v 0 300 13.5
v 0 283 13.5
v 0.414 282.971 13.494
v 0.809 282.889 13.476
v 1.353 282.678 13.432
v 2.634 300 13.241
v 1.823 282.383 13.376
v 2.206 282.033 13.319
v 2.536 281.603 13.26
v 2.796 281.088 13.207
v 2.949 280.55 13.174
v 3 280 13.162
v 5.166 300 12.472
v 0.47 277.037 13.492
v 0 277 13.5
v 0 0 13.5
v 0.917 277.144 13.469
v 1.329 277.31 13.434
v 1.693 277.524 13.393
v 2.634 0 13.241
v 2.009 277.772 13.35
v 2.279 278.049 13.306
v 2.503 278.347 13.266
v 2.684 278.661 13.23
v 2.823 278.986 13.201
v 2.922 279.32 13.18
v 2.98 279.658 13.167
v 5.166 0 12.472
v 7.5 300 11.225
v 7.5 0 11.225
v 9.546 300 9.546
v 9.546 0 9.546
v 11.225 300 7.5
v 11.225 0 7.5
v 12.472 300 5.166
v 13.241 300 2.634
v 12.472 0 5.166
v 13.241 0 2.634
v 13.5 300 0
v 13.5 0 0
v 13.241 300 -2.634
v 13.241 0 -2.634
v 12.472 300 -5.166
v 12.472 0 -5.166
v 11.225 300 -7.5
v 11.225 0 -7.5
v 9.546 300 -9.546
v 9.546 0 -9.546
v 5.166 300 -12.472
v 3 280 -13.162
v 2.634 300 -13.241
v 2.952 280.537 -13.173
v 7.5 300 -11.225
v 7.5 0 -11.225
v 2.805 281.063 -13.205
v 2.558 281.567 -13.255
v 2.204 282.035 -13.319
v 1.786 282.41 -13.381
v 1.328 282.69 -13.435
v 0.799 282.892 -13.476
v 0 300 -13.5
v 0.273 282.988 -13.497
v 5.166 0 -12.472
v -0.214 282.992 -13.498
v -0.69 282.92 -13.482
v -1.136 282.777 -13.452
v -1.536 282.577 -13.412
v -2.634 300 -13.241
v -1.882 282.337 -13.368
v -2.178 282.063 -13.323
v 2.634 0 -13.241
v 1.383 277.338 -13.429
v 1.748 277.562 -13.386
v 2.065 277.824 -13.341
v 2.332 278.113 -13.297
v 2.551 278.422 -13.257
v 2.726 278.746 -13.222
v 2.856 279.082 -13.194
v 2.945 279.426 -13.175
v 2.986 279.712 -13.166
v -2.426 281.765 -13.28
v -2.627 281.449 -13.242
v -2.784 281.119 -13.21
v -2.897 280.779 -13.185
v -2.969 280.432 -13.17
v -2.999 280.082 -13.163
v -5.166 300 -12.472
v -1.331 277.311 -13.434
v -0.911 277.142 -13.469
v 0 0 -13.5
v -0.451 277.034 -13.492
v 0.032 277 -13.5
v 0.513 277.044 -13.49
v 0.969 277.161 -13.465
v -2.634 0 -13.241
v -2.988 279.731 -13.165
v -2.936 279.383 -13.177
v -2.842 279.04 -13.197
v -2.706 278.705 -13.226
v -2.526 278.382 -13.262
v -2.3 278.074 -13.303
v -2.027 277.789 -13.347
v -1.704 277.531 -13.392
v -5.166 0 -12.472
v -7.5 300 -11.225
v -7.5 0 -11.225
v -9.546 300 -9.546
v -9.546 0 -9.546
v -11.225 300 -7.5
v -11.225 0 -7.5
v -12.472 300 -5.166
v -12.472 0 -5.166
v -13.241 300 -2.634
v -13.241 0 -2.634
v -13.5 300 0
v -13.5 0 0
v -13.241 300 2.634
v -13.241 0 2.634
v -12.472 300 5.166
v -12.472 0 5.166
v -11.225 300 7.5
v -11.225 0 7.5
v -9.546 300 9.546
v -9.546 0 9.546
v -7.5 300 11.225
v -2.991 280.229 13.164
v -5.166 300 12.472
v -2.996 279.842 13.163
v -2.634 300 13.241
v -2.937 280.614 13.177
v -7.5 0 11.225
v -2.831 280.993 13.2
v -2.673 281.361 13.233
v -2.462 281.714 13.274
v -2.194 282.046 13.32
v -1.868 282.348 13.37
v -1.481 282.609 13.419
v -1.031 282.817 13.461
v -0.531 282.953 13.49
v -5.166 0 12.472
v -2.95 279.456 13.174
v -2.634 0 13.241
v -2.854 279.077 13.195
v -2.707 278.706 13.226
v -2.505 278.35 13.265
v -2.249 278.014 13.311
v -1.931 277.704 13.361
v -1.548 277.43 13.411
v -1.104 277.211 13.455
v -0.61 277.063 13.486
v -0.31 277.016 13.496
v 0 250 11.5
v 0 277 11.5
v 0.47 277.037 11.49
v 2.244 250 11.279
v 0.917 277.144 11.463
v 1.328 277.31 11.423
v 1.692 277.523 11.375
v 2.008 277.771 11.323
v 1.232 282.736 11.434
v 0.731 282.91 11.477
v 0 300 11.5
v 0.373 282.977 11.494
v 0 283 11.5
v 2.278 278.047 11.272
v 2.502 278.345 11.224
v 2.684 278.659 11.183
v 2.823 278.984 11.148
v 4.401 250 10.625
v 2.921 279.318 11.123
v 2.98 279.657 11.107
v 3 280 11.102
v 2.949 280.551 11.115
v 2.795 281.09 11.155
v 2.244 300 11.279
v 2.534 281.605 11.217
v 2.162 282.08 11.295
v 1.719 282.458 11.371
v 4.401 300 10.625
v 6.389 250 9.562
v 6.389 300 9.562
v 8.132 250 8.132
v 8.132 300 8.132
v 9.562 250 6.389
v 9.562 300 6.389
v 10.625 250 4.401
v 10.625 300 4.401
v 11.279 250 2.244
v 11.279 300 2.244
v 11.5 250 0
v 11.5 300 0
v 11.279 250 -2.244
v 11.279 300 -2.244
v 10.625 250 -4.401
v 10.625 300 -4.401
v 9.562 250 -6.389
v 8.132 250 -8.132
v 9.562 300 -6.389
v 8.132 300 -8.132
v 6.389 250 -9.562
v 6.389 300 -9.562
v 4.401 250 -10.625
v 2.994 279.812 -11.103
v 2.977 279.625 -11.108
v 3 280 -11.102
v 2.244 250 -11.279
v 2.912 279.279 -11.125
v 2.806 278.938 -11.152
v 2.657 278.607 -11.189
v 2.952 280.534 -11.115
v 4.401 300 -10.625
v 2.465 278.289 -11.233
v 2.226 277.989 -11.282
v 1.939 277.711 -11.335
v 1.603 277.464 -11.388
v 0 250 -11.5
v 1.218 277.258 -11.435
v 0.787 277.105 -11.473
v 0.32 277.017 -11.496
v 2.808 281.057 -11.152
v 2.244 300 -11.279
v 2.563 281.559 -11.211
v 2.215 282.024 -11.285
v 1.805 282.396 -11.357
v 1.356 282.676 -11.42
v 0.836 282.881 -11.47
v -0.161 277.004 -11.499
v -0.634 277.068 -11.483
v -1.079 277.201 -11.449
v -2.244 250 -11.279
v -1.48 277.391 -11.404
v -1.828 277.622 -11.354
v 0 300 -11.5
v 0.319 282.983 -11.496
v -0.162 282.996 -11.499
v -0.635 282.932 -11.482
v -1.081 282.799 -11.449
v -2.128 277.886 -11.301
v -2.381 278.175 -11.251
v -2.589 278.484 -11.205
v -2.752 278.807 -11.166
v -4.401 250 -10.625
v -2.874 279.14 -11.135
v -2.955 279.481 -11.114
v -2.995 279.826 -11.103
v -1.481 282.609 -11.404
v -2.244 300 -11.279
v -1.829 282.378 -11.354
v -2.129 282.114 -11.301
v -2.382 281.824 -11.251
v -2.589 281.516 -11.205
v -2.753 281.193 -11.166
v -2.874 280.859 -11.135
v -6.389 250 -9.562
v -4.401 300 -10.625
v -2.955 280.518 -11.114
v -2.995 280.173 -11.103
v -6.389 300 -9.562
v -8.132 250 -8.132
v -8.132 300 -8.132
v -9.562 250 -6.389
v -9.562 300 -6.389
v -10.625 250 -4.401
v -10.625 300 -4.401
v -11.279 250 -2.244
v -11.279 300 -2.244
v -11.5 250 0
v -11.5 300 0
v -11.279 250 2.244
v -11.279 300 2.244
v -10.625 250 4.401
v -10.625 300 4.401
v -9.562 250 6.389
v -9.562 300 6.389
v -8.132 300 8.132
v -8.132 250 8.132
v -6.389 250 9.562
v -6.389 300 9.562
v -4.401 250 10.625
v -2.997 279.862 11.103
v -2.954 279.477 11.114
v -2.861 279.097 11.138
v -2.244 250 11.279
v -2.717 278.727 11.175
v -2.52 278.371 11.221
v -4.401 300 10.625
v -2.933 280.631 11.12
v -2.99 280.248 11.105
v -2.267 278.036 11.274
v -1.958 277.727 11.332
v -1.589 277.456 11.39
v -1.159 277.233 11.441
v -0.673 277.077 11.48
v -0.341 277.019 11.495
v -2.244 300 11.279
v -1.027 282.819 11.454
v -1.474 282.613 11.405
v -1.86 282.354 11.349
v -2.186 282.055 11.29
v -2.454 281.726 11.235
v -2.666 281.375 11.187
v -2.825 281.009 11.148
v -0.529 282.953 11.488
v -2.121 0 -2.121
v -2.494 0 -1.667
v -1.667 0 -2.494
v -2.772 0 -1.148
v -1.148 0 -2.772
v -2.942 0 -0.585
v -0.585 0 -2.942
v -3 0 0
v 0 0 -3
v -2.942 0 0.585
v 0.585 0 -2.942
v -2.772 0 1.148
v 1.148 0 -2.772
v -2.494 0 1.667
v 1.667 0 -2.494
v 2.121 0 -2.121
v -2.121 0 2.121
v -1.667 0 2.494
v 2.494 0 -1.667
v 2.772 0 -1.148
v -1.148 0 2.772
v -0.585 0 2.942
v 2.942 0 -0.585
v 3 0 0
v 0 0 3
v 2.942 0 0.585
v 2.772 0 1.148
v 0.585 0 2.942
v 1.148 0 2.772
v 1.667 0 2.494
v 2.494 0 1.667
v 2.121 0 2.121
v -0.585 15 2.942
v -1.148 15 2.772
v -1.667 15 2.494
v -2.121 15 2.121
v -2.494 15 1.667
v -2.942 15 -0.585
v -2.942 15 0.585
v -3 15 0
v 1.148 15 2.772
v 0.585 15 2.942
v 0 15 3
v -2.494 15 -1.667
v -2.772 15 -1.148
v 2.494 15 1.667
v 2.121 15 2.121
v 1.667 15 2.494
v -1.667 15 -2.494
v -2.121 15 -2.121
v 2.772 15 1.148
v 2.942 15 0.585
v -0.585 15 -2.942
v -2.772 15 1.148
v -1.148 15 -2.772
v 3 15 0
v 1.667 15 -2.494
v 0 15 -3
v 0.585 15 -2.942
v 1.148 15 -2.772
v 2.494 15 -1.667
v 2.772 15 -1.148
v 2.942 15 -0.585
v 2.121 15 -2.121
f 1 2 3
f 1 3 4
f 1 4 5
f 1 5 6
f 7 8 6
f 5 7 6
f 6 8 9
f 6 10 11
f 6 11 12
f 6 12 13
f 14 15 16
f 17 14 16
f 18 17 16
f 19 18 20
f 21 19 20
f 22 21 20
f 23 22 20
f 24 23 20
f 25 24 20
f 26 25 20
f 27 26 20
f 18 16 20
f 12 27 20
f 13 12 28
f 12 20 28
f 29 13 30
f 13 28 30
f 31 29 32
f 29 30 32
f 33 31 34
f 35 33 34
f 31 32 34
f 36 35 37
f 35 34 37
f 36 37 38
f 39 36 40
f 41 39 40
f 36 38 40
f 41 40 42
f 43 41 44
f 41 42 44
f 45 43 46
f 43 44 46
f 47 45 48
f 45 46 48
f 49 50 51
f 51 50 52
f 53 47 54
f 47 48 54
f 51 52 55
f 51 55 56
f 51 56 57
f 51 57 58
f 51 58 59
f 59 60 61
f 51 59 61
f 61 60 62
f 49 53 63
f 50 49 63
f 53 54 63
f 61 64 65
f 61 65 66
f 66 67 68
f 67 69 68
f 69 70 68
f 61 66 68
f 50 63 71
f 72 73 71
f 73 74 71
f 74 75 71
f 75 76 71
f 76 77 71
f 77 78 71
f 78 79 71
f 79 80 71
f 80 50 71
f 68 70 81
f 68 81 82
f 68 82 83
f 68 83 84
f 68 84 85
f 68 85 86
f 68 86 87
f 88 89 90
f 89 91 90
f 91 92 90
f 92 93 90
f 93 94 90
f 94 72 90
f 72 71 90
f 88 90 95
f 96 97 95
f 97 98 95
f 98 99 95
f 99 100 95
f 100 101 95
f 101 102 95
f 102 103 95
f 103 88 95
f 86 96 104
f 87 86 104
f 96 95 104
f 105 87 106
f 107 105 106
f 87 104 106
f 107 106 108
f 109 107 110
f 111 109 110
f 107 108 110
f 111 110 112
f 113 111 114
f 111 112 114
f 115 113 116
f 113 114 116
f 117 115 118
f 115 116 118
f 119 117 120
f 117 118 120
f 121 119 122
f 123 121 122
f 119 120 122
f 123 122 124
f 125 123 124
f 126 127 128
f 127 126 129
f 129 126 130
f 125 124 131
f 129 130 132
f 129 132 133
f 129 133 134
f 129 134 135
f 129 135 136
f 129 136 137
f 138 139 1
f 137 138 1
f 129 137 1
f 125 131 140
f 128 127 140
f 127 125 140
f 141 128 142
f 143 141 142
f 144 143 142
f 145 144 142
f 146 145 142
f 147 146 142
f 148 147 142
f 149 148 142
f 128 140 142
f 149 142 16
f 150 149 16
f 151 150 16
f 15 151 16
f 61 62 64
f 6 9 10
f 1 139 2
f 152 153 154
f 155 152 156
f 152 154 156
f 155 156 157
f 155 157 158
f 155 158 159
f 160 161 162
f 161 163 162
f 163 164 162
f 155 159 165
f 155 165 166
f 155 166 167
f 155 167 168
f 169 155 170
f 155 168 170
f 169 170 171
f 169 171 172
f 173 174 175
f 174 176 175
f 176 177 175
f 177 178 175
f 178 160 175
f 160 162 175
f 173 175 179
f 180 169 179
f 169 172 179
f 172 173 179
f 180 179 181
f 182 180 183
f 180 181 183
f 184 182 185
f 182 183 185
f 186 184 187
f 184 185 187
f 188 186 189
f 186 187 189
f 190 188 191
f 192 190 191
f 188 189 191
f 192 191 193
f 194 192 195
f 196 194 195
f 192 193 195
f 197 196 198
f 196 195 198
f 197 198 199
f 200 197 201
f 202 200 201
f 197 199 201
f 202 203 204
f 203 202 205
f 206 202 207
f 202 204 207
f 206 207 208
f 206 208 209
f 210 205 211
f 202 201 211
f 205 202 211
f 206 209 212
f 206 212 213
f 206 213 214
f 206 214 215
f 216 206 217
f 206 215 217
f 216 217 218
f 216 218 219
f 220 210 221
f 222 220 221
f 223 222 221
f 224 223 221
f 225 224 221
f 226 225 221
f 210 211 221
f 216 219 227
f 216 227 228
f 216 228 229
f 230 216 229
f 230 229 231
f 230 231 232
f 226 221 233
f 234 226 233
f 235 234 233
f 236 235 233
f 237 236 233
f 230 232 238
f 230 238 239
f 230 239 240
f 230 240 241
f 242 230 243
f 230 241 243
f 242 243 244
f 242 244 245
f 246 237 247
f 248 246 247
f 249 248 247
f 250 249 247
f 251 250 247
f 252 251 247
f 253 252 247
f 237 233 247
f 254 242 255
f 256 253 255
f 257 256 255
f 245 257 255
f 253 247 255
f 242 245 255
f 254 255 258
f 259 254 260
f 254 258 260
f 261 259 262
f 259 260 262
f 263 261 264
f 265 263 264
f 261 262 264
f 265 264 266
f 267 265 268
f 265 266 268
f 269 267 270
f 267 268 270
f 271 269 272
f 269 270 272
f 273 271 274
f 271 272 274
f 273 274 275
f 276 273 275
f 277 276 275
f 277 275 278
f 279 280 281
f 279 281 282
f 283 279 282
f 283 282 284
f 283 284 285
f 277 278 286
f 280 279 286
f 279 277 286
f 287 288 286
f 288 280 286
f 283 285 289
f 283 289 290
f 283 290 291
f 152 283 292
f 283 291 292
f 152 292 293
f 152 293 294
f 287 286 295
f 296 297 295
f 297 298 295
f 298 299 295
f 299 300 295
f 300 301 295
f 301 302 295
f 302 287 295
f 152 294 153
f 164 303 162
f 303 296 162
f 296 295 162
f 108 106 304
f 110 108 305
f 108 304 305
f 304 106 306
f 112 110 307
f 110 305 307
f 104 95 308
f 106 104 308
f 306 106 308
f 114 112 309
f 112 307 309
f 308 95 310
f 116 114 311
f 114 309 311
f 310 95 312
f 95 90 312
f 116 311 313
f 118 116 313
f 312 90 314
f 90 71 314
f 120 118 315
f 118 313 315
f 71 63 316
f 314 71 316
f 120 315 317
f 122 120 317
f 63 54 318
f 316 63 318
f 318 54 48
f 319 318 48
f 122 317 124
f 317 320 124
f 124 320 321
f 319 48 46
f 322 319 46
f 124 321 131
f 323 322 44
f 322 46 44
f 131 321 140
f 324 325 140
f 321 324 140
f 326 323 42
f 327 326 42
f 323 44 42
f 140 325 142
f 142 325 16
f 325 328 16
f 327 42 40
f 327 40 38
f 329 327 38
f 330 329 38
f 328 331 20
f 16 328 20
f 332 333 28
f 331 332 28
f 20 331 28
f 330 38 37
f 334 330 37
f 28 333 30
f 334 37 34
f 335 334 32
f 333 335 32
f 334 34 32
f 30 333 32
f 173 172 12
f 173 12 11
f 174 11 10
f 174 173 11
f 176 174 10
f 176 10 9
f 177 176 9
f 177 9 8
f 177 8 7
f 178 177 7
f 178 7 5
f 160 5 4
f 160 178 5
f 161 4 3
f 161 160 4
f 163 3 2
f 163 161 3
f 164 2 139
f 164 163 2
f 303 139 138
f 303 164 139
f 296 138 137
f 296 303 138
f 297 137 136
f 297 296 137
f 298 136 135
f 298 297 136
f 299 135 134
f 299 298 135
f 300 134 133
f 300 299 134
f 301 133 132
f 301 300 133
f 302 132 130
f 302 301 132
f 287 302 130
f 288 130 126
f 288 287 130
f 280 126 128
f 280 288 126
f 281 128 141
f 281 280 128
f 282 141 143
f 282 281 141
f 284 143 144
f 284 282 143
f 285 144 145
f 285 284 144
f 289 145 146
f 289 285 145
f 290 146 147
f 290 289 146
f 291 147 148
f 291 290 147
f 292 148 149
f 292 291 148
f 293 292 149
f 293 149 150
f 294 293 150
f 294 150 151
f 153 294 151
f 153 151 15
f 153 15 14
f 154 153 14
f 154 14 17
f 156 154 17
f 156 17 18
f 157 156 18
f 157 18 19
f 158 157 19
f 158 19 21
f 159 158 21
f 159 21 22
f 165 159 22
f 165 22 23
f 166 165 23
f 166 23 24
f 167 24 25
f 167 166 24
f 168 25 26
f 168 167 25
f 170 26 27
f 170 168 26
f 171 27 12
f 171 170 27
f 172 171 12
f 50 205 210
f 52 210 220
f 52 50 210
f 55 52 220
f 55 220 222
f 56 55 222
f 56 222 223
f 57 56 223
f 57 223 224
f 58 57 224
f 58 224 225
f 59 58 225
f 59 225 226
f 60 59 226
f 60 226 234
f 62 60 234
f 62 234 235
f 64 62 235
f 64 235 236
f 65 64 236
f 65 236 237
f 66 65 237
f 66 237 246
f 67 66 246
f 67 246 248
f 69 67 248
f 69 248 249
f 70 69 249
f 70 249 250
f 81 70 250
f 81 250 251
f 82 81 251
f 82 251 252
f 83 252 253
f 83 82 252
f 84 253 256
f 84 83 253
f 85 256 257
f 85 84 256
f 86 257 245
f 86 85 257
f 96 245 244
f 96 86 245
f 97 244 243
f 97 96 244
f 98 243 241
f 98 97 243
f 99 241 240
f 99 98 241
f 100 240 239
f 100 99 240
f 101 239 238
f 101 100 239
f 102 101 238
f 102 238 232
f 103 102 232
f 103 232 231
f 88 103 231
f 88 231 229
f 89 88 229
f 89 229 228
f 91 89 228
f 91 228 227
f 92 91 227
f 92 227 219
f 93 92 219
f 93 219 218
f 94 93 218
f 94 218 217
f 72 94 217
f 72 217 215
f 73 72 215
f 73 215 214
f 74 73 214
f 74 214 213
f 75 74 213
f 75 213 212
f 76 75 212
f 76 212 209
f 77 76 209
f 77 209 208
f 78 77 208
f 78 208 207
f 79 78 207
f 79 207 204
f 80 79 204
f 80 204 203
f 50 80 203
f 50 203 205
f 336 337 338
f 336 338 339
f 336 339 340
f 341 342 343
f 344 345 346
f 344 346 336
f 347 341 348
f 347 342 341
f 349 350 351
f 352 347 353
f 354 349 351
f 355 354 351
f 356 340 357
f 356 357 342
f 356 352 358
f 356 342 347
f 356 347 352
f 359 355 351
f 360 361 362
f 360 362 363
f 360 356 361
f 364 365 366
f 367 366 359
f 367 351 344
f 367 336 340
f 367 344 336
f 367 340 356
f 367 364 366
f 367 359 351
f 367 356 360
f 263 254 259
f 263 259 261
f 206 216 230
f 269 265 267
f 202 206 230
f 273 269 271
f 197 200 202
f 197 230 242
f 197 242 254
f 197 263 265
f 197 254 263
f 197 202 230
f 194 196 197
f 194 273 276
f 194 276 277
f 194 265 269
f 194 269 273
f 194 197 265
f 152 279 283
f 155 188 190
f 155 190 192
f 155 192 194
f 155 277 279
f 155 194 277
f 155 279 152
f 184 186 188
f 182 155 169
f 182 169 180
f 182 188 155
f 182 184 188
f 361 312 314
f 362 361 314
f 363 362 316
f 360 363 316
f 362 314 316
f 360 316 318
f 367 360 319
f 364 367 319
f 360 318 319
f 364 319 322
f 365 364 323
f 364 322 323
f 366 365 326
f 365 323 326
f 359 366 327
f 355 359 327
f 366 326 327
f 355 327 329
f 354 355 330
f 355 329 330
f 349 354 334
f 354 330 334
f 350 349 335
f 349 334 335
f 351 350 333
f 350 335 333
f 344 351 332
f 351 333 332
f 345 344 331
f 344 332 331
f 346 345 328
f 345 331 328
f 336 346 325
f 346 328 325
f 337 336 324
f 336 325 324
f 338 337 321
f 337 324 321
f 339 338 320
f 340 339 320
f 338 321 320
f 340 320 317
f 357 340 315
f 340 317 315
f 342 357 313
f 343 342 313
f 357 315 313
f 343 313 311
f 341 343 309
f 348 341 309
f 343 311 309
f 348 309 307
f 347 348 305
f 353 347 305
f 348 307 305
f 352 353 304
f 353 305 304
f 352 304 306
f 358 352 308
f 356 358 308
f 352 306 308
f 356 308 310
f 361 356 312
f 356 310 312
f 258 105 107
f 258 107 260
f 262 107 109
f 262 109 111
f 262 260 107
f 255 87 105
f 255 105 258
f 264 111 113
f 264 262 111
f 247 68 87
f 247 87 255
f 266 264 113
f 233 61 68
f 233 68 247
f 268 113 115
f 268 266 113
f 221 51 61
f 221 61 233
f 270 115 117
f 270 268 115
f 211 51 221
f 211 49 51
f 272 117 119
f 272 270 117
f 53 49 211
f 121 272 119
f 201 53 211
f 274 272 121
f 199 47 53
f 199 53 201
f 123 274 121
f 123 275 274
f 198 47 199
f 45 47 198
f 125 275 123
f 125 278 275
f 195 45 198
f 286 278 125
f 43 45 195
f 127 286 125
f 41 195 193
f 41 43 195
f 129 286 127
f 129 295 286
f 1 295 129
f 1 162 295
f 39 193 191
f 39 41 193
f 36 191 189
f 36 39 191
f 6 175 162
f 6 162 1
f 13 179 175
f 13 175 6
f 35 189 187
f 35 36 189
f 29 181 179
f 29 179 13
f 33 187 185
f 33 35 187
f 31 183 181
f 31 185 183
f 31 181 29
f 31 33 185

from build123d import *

# Parameters (mm, degrees)
CROQUIS1_R                 = 13.5
SALIENTE_EXTRUIR1_DEPTH    = 300
CROQUIS2_R                 = 3
CORTAR_EXTRUIR1_DEPTH      = 15
CROQUIS4_R                 = 11.5
CORTAR_EXTRUIR4_DEPTH      = 50
CORTAR_EXTRUIR5_DEPTH      = 301.606886149
CORTAR_EXTRUIR5_DEPTH_BACK = 301.606886149
CROQUIS5_R                 = 3


with BuildPart() as part:
    # Croquis1 → Saliente-Extruir1 (new body)
    with BuildSketch(Plane(origin=(0, 0, 0), x_dir=(1, 0, 0), z_dir=(0, 1, 0))):
        with Locations(Location((0, 0, 0), (0, 0, 270))):
            Circle(CROQUIS1_R)
    extrude(amount=SALIENTE_EXTRUIR1_DEPTH)

    # Croquis2 → Cortar-Extruir1 (cut)
    with BuildSketch(Plane.XZ):
        with Locations(Location((0, 0, 0), (0, 0, 270))):
            Circle(CROQUIS2_R)
    extrude(amount=-CORTAR_EXTRUIR1_DEPTH, mode=Mode.SUBTRACT)

    # Croquis4 → Cortar-Extruir4 (cut)
    with BuildSketch(Plane(origin=(0, 300, 0), x_dir=(1, 0, 0), z_dir=(0, 1, 0))):
        with Locations(Location((0, 0, 0), (0, 0, 270))):
            Circle(CROQUIS4_R)
    extrude(amount=-CORTAR_EXTRUIR4_DEPTH, mode=Mode.SUBTRACT)

    # Croquis5 → Cortar-Extruir5 (cut, two sides: drawn at the far end of the back side and taken through both)
    with BuildSketch(Plane.XY.offset(-CORTAR_EXTRUIR5_DEPTH_BACK)):
        with Locations((0, 280)):
            Circle(CROQUIS5_R)
    extrude(amount=CORTAR_EXTRUIR5_DEPTH + CORTAR_EXTRUIR5_DEPTH_BACK, mode=Mode.SUBTRACT)


solid = part.part
